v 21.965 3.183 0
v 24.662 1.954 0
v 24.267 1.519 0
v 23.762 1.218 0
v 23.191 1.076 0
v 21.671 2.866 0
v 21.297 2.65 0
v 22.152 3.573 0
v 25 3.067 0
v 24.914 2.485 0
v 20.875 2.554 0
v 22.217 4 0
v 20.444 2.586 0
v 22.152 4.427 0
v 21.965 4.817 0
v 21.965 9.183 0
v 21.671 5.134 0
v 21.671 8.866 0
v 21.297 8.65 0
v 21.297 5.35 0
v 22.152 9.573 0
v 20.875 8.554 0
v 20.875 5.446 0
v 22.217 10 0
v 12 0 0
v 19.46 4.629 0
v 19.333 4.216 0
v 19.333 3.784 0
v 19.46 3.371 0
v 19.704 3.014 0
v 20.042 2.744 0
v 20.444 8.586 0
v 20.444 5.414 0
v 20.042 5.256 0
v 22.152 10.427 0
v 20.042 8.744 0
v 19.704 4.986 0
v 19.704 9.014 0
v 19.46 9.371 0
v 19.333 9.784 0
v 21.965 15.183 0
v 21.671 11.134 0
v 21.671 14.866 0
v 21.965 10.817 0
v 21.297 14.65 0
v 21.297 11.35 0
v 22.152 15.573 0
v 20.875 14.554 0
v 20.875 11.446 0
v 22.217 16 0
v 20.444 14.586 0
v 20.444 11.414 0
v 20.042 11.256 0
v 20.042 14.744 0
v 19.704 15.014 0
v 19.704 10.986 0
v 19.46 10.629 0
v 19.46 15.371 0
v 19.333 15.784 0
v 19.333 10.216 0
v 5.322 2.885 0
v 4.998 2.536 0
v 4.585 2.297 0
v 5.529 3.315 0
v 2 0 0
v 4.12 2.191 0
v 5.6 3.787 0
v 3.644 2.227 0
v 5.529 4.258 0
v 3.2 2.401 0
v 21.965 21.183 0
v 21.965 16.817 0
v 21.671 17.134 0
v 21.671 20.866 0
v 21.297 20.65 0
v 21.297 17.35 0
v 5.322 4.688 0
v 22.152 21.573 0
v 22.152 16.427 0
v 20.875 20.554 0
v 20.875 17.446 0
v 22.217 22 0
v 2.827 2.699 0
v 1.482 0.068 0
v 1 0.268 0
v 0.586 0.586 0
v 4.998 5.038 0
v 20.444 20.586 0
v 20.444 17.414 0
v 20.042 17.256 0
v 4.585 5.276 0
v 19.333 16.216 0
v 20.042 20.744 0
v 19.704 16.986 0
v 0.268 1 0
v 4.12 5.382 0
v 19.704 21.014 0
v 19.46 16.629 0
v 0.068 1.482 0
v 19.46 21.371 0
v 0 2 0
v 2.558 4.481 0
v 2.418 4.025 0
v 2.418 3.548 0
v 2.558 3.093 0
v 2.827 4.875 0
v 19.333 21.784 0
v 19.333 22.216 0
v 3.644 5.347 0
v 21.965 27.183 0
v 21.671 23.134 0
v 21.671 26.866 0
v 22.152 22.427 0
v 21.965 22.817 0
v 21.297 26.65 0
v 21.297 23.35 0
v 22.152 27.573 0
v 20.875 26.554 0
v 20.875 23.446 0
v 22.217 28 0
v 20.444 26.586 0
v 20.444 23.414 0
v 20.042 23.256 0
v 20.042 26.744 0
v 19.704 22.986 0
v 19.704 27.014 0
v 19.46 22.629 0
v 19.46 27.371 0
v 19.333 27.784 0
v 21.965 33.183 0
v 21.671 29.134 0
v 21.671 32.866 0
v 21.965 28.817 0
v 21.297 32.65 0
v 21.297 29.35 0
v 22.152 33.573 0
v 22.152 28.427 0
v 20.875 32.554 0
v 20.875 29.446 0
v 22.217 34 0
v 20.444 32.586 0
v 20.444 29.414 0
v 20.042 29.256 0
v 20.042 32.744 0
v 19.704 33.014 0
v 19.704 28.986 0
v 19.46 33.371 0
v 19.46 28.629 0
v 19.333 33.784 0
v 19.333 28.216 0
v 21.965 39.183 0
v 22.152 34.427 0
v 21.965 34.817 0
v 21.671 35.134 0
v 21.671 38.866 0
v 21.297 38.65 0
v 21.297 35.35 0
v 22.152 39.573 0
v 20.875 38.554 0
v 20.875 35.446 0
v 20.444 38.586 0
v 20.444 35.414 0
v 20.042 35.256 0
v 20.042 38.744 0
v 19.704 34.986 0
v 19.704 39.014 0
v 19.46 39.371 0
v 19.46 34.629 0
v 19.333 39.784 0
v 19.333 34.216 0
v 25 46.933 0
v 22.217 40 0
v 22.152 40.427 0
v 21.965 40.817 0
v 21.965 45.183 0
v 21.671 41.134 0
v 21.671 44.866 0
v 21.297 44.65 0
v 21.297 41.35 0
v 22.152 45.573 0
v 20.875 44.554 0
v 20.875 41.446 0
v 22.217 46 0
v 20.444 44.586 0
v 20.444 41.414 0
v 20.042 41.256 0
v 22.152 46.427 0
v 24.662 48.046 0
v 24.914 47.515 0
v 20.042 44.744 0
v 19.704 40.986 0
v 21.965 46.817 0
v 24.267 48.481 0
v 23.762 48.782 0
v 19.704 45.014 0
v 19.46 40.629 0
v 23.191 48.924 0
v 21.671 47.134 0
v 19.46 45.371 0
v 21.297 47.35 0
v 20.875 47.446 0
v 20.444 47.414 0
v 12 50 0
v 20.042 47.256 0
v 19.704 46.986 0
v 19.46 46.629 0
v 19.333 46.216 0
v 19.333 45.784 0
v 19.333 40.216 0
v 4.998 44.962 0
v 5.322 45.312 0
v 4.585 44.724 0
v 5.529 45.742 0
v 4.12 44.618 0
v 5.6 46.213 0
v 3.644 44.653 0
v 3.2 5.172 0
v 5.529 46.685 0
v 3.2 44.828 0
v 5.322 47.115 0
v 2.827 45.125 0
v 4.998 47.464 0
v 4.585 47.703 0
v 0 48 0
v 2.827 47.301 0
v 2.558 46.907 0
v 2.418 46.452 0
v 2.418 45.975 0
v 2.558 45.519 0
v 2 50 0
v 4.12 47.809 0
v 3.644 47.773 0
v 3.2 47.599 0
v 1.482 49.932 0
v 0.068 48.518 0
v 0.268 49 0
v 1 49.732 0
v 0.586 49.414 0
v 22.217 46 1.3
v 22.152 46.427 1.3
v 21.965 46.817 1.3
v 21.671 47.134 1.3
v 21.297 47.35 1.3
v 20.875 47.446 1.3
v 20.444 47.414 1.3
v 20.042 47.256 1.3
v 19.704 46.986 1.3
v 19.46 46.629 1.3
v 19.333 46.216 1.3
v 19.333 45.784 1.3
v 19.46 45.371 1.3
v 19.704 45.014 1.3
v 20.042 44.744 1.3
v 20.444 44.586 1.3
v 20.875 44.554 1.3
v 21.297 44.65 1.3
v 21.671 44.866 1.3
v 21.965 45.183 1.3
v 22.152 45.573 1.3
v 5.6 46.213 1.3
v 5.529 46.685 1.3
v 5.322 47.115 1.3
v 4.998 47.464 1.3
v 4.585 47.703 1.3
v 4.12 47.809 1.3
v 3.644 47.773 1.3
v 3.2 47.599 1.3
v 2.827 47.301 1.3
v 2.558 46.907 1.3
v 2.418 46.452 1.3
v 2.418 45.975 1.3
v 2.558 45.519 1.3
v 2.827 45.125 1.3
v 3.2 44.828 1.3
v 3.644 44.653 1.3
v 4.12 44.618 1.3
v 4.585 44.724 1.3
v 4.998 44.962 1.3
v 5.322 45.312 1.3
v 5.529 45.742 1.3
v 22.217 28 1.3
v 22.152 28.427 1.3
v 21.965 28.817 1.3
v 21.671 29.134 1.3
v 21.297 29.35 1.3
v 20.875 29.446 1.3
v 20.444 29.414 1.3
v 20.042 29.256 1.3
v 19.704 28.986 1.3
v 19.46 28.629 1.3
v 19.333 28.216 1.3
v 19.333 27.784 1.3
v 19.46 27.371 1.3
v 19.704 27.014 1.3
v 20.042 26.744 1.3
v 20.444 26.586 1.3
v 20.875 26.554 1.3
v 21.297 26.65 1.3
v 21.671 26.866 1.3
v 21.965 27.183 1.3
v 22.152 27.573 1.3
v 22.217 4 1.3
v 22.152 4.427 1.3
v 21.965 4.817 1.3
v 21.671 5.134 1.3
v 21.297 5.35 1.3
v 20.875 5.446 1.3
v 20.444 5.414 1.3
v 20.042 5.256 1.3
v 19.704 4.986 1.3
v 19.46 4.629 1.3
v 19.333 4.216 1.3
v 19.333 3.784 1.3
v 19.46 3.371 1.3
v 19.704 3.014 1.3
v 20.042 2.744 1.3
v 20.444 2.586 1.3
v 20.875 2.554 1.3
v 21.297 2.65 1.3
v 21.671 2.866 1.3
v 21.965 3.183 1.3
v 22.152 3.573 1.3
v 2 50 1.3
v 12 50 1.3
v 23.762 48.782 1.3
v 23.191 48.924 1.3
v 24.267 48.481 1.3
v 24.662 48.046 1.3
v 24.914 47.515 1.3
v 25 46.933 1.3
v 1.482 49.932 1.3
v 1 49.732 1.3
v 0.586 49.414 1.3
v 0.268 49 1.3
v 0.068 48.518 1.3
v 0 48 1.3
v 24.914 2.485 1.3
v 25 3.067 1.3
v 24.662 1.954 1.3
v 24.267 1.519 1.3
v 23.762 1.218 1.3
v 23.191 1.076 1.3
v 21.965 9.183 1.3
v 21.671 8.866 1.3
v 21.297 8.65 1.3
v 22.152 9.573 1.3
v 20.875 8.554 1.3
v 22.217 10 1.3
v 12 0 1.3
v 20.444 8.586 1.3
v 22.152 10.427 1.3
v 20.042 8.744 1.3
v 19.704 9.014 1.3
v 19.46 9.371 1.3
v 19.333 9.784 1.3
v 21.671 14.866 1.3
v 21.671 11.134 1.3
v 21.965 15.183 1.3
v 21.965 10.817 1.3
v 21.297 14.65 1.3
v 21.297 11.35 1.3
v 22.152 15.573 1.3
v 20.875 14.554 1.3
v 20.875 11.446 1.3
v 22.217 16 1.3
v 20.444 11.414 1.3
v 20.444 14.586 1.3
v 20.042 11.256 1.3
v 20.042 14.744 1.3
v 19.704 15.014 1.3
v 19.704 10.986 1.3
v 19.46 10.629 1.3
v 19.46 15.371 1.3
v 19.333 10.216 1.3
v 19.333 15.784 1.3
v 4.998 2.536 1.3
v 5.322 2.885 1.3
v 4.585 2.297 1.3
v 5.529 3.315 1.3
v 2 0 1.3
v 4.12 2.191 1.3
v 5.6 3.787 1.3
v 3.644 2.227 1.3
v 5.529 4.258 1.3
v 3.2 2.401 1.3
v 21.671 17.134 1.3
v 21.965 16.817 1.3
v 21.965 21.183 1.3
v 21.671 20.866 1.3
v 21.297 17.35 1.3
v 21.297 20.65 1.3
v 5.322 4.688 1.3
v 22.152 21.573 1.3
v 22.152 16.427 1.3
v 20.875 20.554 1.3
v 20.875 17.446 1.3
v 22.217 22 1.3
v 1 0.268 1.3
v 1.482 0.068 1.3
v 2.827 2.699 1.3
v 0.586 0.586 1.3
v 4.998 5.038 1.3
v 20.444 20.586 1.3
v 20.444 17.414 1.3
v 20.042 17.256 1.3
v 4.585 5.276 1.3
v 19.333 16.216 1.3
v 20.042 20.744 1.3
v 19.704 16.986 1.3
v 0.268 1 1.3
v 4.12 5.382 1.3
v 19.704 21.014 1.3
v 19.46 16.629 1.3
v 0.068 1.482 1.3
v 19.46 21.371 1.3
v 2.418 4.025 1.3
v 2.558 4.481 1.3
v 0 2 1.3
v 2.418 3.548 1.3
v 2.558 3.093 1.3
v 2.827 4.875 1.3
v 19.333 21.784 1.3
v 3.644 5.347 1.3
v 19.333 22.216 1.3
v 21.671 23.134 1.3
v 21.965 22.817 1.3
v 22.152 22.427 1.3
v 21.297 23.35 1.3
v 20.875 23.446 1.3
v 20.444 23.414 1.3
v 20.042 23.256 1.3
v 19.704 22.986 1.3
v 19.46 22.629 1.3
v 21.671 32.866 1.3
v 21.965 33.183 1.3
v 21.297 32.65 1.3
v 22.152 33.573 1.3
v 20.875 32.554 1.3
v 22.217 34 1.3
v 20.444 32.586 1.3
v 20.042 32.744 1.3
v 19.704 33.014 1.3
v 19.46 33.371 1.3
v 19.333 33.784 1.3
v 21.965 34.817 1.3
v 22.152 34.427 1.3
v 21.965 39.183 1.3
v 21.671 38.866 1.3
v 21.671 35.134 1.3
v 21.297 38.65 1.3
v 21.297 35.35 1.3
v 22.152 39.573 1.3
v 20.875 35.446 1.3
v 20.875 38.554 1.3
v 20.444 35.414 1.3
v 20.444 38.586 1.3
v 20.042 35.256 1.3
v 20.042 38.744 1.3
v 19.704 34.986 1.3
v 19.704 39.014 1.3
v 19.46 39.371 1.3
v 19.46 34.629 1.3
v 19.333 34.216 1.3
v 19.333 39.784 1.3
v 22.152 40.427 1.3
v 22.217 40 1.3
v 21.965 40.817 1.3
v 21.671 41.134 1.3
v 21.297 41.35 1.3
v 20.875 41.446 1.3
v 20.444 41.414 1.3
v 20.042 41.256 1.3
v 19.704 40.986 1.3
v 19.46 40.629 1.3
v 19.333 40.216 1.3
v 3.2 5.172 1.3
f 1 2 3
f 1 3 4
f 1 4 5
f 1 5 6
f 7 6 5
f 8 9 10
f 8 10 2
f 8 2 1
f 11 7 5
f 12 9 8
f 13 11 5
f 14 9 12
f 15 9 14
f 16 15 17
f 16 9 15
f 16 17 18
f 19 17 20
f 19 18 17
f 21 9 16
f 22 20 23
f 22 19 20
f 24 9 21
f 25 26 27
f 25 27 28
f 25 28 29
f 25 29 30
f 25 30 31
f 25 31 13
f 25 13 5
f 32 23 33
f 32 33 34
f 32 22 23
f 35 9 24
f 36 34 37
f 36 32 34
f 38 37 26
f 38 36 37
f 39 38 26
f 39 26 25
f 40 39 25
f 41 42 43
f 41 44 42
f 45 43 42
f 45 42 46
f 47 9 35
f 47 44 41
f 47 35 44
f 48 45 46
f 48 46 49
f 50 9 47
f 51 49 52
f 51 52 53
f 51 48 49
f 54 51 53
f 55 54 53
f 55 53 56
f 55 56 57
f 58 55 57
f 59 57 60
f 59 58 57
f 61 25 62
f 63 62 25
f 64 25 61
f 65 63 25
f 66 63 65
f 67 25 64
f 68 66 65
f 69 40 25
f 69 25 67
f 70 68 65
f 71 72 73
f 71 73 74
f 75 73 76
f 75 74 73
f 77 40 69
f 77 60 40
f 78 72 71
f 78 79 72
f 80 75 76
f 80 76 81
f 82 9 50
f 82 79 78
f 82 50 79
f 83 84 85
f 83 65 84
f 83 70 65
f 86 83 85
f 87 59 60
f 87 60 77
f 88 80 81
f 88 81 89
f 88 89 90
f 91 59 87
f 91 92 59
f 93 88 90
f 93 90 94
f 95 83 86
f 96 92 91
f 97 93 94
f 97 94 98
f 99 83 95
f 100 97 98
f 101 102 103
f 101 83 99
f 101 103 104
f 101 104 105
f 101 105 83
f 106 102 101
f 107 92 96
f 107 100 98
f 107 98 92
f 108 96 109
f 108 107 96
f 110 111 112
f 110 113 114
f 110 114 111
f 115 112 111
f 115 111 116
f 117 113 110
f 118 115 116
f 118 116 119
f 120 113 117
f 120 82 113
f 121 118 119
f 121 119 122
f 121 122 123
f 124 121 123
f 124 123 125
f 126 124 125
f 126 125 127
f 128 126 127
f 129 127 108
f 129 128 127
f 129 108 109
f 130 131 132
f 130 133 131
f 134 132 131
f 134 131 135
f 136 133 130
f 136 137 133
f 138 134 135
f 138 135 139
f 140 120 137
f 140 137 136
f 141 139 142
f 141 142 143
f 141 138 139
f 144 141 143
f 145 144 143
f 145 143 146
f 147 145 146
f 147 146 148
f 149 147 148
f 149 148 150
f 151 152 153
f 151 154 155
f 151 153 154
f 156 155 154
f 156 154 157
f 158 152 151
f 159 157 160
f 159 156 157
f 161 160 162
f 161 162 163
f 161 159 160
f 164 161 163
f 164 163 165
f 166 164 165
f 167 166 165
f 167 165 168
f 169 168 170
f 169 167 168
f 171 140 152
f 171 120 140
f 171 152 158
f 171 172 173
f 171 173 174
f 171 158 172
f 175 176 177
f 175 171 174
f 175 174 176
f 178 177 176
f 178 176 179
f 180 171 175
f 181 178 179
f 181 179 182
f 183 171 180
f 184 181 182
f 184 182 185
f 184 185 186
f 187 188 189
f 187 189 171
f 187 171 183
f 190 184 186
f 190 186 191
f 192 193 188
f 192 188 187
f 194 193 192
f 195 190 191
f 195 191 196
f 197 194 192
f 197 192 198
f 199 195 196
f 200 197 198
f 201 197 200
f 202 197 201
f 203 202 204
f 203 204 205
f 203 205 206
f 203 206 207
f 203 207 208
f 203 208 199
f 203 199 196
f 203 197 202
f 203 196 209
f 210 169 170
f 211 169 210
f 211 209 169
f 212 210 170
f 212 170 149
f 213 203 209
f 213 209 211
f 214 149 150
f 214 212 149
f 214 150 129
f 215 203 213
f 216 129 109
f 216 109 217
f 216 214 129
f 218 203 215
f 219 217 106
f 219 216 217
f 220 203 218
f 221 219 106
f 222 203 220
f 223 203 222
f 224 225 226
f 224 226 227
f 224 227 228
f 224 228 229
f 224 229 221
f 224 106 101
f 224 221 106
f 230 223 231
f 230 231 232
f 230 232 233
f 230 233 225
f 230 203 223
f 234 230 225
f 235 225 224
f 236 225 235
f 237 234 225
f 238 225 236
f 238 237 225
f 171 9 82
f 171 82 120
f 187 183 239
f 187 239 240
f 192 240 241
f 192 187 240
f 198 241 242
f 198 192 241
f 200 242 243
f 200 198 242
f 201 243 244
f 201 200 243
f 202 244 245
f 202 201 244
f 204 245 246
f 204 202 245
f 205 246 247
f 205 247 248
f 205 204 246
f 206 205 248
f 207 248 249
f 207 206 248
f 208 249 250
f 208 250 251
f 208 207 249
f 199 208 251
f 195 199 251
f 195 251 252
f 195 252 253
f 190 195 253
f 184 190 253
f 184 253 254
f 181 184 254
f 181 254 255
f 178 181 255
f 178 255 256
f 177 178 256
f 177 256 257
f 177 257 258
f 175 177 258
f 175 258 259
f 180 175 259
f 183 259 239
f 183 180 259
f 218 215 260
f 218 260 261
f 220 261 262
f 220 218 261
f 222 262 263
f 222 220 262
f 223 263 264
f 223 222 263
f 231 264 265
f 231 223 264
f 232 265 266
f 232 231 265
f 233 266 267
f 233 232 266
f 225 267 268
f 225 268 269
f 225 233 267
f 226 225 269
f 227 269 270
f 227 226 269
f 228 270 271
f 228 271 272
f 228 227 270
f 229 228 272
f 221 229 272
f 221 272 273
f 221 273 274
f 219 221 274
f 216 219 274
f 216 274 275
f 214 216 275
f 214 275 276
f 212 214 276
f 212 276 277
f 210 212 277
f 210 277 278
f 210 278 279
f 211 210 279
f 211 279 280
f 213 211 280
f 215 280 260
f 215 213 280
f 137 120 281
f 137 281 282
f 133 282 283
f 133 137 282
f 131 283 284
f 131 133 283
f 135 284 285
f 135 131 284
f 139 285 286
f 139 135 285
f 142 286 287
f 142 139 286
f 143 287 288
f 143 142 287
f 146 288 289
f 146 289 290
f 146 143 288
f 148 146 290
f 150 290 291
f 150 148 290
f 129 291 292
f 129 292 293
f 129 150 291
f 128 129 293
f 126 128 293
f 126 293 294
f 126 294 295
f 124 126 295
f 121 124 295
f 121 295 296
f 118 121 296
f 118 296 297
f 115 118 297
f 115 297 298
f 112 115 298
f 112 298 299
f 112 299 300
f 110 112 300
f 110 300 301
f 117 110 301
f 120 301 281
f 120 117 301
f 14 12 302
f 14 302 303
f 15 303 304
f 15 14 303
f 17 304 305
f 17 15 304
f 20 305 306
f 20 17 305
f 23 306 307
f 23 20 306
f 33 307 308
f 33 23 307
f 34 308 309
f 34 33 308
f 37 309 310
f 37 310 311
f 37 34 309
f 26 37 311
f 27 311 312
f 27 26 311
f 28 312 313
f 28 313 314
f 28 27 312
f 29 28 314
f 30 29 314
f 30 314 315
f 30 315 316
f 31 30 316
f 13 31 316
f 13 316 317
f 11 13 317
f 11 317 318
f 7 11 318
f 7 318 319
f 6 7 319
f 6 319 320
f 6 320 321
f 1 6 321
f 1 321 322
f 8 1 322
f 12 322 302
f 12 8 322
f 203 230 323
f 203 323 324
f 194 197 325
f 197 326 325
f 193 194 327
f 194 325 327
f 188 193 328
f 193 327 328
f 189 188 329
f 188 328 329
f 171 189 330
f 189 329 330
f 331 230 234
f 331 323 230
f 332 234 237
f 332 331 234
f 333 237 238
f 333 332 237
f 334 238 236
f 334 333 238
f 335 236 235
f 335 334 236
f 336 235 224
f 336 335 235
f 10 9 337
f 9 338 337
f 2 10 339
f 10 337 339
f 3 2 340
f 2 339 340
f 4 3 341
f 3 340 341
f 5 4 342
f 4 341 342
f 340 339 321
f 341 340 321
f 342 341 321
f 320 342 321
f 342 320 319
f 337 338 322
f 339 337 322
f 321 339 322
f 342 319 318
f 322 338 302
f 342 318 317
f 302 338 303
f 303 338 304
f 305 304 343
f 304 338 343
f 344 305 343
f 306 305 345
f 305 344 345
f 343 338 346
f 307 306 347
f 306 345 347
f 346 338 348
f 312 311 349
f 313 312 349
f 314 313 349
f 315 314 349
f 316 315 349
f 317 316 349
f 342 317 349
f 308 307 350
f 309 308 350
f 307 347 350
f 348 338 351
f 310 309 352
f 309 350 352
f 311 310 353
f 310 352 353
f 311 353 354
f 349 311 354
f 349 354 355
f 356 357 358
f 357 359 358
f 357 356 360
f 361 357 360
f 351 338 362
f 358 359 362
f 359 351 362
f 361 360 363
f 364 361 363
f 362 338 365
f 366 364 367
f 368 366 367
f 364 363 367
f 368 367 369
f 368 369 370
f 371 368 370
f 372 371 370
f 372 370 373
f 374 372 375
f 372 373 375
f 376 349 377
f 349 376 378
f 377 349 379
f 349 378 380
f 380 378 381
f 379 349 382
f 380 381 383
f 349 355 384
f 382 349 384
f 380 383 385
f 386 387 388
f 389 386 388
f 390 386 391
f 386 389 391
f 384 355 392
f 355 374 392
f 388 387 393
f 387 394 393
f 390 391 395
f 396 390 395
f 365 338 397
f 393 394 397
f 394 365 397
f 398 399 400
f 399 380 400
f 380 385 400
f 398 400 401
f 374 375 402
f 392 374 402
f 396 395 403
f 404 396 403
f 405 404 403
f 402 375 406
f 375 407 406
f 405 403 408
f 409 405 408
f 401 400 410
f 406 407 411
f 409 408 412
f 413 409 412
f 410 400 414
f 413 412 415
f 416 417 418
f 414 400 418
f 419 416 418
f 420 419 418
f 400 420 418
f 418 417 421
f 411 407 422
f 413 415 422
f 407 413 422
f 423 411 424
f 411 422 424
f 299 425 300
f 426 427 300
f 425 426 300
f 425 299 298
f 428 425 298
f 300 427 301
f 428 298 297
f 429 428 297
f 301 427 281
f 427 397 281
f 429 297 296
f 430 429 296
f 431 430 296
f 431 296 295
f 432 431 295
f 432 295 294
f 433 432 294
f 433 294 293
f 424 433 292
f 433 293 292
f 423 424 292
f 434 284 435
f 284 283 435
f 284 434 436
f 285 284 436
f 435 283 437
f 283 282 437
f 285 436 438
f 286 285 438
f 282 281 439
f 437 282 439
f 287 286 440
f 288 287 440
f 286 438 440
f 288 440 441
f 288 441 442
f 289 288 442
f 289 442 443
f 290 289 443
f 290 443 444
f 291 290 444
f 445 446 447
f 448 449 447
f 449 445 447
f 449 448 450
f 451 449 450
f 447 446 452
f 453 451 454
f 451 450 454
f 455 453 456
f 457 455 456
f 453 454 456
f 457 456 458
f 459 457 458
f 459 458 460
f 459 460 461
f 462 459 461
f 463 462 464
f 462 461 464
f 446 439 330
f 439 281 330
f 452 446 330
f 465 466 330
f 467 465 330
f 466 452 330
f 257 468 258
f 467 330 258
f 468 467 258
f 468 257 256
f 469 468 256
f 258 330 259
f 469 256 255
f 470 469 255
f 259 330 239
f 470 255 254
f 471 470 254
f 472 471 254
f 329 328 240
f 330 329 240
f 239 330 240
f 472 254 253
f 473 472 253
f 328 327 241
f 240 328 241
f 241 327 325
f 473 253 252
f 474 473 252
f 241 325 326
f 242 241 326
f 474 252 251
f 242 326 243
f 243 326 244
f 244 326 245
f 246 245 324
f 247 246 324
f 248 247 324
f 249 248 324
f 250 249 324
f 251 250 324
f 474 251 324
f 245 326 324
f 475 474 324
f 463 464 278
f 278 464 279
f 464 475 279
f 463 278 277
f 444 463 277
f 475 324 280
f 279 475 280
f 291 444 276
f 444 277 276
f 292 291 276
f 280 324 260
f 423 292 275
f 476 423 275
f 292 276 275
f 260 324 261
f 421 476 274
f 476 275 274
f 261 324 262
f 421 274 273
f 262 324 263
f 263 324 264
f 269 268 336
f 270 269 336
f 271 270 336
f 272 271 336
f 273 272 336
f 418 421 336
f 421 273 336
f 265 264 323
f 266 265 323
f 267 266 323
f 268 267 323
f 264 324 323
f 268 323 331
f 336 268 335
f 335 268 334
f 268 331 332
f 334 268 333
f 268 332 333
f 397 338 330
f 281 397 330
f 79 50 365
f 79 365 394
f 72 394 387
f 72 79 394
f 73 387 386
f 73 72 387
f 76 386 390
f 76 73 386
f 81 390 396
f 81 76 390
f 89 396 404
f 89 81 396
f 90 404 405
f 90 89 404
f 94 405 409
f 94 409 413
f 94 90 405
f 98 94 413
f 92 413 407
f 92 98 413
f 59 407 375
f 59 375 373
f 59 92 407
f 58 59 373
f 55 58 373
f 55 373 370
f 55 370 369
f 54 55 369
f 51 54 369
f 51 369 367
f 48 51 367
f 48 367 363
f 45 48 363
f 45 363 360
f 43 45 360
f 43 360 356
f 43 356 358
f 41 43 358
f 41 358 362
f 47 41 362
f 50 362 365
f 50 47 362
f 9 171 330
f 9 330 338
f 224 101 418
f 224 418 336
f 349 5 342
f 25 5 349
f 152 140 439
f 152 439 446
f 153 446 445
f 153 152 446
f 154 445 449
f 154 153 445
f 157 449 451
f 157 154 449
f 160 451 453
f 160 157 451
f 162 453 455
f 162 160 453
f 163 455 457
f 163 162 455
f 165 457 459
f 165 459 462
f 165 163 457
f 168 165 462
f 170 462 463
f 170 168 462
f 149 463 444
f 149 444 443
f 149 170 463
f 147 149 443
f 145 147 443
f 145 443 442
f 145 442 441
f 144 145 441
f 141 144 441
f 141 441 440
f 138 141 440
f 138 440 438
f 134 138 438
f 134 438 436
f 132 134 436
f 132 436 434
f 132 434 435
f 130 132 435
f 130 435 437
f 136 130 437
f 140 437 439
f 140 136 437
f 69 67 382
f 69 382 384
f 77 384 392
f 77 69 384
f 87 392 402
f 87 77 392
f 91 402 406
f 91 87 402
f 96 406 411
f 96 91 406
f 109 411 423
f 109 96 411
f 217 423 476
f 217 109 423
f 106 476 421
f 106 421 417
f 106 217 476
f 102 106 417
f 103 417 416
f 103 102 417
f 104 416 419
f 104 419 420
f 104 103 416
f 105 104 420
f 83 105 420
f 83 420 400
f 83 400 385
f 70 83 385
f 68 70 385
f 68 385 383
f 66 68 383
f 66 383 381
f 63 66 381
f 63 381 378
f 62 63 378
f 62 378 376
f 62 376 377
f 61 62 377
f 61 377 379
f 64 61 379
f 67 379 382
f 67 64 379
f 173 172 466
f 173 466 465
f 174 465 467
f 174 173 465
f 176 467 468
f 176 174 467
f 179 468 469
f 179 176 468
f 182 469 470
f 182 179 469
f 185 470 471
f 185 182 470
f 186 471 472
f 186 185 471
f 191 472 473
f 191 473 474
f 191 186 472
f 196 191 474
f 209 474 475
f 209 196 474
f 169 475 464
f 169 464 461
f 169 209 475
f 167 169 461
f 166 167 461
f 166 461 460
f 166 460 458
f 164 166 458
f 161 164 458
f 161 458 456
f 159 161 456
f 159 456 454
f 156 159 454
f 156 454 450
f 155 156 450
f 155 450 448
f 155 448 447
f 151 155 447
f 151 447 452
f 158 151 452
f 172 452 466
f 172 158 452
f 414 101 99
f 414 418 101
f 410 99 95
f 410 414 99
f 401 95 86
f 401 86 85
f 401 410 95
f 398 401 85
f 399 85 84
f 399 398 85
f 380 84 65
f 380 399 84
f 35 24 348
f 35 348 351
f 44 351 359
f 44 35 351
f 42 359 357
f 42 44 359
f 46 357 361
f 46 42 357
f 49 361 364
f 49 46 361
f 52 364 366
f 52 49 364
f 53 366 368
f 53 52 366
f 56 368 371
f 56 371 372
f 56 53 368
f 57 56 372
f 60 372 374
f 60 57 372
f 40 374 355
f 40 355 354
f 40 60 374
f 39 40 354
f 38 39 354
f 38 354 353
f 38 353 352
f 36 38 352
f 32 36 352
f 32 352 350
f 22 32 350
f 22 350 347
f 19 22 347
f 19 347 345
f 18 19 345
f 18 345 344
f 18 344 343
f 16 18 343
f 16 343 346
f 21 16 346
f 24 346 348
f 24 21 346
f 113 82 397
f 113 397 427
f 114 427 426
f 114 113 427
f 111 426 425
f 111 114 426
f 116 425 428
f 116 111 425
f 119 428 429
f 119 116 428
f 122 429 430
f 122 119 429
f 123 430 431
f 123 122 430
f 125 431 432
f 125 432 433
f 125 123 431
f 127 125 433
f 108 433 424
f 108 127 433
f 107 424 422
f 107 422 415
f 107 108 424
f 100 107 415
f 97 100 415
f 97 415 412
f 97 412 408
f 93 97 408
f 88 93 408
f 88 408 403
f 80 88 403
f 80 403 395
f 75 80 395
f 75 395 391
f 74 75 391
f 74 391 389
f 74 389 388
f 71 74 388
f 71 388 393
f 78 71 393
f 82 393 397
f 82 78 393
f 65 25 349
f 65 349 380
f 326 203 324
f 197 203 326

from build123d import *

# Parameters (mm, degrees)
SKETCH1_R           = 1.6
SKETCH1_R_2         = 1.45
BOSS_EXTRUDE1_DEPTH = 1.3
FILLET1_R           = 2


with BuildPart() as part:
    # Sketch1 → Boss-Extrude1 (new body)
    with BuildSketch(Plane.XY):
        Polygon((12, 50), (25, 48.75), (25, 1.25), (12, 0), (0, 0), (0, 50), align=None)
        with Locations((4, 46.213205)):
            Circle(SKETCH1_R, mode=Mode.SUBTRACT)
        with Locations((4, 3.786795)):
            Circle(SKETCH1_R, mode=Mode.SUBTRACT)
        with Locations((20.766795, 46)):
            Circle(SKETCH1_R_2, mode=Mode.SUBTRACT)
        with Locations((20.766795, 4)):
            Circle(SKETCH1_R_2, mode=Mode.SUBTRACT)
        with Locations((20.766795, 40)):
            Circle(SKETCH1_R_2, mode=Mode.SUBTRACT)
        with Locations((20.766795, 34)):
            Circle(SKETCH1_R_2, mode=Mode.SUBTRACT)
        with Locations((20.766795, 28)):
            Circle(SKETCH1_R_2, mode=Mode.SUBTRACT)
        with Locations((20.766795, 22)):
            Circle(SKETCH1_R_2, mode=Mode.SUBTRACT)
        with Locations((20.766795, 16)):
            Circle(SKETCH1_R_2, mode=Mode.SUBTRACT)
        with Locations((20.766795, 10)):
            Circle(SKETCH1_R_2, mode=Mode.SUBTRACT)
    extrude(amount=BOSS_EXTRUDE1_DEPTH)

    # Fillet1
    fillet1_edges = [part.edges().sort_by_distance(p)[0] for p in [
        (0, 50, 0.65),
        (25, 48.75, 0.65),
        (25, 1.25, 0.65),
        (0, 0, 0.65),
    ]]
    fillet(fillet1_edges, radius=FILLET1_R)


solid = part.part
